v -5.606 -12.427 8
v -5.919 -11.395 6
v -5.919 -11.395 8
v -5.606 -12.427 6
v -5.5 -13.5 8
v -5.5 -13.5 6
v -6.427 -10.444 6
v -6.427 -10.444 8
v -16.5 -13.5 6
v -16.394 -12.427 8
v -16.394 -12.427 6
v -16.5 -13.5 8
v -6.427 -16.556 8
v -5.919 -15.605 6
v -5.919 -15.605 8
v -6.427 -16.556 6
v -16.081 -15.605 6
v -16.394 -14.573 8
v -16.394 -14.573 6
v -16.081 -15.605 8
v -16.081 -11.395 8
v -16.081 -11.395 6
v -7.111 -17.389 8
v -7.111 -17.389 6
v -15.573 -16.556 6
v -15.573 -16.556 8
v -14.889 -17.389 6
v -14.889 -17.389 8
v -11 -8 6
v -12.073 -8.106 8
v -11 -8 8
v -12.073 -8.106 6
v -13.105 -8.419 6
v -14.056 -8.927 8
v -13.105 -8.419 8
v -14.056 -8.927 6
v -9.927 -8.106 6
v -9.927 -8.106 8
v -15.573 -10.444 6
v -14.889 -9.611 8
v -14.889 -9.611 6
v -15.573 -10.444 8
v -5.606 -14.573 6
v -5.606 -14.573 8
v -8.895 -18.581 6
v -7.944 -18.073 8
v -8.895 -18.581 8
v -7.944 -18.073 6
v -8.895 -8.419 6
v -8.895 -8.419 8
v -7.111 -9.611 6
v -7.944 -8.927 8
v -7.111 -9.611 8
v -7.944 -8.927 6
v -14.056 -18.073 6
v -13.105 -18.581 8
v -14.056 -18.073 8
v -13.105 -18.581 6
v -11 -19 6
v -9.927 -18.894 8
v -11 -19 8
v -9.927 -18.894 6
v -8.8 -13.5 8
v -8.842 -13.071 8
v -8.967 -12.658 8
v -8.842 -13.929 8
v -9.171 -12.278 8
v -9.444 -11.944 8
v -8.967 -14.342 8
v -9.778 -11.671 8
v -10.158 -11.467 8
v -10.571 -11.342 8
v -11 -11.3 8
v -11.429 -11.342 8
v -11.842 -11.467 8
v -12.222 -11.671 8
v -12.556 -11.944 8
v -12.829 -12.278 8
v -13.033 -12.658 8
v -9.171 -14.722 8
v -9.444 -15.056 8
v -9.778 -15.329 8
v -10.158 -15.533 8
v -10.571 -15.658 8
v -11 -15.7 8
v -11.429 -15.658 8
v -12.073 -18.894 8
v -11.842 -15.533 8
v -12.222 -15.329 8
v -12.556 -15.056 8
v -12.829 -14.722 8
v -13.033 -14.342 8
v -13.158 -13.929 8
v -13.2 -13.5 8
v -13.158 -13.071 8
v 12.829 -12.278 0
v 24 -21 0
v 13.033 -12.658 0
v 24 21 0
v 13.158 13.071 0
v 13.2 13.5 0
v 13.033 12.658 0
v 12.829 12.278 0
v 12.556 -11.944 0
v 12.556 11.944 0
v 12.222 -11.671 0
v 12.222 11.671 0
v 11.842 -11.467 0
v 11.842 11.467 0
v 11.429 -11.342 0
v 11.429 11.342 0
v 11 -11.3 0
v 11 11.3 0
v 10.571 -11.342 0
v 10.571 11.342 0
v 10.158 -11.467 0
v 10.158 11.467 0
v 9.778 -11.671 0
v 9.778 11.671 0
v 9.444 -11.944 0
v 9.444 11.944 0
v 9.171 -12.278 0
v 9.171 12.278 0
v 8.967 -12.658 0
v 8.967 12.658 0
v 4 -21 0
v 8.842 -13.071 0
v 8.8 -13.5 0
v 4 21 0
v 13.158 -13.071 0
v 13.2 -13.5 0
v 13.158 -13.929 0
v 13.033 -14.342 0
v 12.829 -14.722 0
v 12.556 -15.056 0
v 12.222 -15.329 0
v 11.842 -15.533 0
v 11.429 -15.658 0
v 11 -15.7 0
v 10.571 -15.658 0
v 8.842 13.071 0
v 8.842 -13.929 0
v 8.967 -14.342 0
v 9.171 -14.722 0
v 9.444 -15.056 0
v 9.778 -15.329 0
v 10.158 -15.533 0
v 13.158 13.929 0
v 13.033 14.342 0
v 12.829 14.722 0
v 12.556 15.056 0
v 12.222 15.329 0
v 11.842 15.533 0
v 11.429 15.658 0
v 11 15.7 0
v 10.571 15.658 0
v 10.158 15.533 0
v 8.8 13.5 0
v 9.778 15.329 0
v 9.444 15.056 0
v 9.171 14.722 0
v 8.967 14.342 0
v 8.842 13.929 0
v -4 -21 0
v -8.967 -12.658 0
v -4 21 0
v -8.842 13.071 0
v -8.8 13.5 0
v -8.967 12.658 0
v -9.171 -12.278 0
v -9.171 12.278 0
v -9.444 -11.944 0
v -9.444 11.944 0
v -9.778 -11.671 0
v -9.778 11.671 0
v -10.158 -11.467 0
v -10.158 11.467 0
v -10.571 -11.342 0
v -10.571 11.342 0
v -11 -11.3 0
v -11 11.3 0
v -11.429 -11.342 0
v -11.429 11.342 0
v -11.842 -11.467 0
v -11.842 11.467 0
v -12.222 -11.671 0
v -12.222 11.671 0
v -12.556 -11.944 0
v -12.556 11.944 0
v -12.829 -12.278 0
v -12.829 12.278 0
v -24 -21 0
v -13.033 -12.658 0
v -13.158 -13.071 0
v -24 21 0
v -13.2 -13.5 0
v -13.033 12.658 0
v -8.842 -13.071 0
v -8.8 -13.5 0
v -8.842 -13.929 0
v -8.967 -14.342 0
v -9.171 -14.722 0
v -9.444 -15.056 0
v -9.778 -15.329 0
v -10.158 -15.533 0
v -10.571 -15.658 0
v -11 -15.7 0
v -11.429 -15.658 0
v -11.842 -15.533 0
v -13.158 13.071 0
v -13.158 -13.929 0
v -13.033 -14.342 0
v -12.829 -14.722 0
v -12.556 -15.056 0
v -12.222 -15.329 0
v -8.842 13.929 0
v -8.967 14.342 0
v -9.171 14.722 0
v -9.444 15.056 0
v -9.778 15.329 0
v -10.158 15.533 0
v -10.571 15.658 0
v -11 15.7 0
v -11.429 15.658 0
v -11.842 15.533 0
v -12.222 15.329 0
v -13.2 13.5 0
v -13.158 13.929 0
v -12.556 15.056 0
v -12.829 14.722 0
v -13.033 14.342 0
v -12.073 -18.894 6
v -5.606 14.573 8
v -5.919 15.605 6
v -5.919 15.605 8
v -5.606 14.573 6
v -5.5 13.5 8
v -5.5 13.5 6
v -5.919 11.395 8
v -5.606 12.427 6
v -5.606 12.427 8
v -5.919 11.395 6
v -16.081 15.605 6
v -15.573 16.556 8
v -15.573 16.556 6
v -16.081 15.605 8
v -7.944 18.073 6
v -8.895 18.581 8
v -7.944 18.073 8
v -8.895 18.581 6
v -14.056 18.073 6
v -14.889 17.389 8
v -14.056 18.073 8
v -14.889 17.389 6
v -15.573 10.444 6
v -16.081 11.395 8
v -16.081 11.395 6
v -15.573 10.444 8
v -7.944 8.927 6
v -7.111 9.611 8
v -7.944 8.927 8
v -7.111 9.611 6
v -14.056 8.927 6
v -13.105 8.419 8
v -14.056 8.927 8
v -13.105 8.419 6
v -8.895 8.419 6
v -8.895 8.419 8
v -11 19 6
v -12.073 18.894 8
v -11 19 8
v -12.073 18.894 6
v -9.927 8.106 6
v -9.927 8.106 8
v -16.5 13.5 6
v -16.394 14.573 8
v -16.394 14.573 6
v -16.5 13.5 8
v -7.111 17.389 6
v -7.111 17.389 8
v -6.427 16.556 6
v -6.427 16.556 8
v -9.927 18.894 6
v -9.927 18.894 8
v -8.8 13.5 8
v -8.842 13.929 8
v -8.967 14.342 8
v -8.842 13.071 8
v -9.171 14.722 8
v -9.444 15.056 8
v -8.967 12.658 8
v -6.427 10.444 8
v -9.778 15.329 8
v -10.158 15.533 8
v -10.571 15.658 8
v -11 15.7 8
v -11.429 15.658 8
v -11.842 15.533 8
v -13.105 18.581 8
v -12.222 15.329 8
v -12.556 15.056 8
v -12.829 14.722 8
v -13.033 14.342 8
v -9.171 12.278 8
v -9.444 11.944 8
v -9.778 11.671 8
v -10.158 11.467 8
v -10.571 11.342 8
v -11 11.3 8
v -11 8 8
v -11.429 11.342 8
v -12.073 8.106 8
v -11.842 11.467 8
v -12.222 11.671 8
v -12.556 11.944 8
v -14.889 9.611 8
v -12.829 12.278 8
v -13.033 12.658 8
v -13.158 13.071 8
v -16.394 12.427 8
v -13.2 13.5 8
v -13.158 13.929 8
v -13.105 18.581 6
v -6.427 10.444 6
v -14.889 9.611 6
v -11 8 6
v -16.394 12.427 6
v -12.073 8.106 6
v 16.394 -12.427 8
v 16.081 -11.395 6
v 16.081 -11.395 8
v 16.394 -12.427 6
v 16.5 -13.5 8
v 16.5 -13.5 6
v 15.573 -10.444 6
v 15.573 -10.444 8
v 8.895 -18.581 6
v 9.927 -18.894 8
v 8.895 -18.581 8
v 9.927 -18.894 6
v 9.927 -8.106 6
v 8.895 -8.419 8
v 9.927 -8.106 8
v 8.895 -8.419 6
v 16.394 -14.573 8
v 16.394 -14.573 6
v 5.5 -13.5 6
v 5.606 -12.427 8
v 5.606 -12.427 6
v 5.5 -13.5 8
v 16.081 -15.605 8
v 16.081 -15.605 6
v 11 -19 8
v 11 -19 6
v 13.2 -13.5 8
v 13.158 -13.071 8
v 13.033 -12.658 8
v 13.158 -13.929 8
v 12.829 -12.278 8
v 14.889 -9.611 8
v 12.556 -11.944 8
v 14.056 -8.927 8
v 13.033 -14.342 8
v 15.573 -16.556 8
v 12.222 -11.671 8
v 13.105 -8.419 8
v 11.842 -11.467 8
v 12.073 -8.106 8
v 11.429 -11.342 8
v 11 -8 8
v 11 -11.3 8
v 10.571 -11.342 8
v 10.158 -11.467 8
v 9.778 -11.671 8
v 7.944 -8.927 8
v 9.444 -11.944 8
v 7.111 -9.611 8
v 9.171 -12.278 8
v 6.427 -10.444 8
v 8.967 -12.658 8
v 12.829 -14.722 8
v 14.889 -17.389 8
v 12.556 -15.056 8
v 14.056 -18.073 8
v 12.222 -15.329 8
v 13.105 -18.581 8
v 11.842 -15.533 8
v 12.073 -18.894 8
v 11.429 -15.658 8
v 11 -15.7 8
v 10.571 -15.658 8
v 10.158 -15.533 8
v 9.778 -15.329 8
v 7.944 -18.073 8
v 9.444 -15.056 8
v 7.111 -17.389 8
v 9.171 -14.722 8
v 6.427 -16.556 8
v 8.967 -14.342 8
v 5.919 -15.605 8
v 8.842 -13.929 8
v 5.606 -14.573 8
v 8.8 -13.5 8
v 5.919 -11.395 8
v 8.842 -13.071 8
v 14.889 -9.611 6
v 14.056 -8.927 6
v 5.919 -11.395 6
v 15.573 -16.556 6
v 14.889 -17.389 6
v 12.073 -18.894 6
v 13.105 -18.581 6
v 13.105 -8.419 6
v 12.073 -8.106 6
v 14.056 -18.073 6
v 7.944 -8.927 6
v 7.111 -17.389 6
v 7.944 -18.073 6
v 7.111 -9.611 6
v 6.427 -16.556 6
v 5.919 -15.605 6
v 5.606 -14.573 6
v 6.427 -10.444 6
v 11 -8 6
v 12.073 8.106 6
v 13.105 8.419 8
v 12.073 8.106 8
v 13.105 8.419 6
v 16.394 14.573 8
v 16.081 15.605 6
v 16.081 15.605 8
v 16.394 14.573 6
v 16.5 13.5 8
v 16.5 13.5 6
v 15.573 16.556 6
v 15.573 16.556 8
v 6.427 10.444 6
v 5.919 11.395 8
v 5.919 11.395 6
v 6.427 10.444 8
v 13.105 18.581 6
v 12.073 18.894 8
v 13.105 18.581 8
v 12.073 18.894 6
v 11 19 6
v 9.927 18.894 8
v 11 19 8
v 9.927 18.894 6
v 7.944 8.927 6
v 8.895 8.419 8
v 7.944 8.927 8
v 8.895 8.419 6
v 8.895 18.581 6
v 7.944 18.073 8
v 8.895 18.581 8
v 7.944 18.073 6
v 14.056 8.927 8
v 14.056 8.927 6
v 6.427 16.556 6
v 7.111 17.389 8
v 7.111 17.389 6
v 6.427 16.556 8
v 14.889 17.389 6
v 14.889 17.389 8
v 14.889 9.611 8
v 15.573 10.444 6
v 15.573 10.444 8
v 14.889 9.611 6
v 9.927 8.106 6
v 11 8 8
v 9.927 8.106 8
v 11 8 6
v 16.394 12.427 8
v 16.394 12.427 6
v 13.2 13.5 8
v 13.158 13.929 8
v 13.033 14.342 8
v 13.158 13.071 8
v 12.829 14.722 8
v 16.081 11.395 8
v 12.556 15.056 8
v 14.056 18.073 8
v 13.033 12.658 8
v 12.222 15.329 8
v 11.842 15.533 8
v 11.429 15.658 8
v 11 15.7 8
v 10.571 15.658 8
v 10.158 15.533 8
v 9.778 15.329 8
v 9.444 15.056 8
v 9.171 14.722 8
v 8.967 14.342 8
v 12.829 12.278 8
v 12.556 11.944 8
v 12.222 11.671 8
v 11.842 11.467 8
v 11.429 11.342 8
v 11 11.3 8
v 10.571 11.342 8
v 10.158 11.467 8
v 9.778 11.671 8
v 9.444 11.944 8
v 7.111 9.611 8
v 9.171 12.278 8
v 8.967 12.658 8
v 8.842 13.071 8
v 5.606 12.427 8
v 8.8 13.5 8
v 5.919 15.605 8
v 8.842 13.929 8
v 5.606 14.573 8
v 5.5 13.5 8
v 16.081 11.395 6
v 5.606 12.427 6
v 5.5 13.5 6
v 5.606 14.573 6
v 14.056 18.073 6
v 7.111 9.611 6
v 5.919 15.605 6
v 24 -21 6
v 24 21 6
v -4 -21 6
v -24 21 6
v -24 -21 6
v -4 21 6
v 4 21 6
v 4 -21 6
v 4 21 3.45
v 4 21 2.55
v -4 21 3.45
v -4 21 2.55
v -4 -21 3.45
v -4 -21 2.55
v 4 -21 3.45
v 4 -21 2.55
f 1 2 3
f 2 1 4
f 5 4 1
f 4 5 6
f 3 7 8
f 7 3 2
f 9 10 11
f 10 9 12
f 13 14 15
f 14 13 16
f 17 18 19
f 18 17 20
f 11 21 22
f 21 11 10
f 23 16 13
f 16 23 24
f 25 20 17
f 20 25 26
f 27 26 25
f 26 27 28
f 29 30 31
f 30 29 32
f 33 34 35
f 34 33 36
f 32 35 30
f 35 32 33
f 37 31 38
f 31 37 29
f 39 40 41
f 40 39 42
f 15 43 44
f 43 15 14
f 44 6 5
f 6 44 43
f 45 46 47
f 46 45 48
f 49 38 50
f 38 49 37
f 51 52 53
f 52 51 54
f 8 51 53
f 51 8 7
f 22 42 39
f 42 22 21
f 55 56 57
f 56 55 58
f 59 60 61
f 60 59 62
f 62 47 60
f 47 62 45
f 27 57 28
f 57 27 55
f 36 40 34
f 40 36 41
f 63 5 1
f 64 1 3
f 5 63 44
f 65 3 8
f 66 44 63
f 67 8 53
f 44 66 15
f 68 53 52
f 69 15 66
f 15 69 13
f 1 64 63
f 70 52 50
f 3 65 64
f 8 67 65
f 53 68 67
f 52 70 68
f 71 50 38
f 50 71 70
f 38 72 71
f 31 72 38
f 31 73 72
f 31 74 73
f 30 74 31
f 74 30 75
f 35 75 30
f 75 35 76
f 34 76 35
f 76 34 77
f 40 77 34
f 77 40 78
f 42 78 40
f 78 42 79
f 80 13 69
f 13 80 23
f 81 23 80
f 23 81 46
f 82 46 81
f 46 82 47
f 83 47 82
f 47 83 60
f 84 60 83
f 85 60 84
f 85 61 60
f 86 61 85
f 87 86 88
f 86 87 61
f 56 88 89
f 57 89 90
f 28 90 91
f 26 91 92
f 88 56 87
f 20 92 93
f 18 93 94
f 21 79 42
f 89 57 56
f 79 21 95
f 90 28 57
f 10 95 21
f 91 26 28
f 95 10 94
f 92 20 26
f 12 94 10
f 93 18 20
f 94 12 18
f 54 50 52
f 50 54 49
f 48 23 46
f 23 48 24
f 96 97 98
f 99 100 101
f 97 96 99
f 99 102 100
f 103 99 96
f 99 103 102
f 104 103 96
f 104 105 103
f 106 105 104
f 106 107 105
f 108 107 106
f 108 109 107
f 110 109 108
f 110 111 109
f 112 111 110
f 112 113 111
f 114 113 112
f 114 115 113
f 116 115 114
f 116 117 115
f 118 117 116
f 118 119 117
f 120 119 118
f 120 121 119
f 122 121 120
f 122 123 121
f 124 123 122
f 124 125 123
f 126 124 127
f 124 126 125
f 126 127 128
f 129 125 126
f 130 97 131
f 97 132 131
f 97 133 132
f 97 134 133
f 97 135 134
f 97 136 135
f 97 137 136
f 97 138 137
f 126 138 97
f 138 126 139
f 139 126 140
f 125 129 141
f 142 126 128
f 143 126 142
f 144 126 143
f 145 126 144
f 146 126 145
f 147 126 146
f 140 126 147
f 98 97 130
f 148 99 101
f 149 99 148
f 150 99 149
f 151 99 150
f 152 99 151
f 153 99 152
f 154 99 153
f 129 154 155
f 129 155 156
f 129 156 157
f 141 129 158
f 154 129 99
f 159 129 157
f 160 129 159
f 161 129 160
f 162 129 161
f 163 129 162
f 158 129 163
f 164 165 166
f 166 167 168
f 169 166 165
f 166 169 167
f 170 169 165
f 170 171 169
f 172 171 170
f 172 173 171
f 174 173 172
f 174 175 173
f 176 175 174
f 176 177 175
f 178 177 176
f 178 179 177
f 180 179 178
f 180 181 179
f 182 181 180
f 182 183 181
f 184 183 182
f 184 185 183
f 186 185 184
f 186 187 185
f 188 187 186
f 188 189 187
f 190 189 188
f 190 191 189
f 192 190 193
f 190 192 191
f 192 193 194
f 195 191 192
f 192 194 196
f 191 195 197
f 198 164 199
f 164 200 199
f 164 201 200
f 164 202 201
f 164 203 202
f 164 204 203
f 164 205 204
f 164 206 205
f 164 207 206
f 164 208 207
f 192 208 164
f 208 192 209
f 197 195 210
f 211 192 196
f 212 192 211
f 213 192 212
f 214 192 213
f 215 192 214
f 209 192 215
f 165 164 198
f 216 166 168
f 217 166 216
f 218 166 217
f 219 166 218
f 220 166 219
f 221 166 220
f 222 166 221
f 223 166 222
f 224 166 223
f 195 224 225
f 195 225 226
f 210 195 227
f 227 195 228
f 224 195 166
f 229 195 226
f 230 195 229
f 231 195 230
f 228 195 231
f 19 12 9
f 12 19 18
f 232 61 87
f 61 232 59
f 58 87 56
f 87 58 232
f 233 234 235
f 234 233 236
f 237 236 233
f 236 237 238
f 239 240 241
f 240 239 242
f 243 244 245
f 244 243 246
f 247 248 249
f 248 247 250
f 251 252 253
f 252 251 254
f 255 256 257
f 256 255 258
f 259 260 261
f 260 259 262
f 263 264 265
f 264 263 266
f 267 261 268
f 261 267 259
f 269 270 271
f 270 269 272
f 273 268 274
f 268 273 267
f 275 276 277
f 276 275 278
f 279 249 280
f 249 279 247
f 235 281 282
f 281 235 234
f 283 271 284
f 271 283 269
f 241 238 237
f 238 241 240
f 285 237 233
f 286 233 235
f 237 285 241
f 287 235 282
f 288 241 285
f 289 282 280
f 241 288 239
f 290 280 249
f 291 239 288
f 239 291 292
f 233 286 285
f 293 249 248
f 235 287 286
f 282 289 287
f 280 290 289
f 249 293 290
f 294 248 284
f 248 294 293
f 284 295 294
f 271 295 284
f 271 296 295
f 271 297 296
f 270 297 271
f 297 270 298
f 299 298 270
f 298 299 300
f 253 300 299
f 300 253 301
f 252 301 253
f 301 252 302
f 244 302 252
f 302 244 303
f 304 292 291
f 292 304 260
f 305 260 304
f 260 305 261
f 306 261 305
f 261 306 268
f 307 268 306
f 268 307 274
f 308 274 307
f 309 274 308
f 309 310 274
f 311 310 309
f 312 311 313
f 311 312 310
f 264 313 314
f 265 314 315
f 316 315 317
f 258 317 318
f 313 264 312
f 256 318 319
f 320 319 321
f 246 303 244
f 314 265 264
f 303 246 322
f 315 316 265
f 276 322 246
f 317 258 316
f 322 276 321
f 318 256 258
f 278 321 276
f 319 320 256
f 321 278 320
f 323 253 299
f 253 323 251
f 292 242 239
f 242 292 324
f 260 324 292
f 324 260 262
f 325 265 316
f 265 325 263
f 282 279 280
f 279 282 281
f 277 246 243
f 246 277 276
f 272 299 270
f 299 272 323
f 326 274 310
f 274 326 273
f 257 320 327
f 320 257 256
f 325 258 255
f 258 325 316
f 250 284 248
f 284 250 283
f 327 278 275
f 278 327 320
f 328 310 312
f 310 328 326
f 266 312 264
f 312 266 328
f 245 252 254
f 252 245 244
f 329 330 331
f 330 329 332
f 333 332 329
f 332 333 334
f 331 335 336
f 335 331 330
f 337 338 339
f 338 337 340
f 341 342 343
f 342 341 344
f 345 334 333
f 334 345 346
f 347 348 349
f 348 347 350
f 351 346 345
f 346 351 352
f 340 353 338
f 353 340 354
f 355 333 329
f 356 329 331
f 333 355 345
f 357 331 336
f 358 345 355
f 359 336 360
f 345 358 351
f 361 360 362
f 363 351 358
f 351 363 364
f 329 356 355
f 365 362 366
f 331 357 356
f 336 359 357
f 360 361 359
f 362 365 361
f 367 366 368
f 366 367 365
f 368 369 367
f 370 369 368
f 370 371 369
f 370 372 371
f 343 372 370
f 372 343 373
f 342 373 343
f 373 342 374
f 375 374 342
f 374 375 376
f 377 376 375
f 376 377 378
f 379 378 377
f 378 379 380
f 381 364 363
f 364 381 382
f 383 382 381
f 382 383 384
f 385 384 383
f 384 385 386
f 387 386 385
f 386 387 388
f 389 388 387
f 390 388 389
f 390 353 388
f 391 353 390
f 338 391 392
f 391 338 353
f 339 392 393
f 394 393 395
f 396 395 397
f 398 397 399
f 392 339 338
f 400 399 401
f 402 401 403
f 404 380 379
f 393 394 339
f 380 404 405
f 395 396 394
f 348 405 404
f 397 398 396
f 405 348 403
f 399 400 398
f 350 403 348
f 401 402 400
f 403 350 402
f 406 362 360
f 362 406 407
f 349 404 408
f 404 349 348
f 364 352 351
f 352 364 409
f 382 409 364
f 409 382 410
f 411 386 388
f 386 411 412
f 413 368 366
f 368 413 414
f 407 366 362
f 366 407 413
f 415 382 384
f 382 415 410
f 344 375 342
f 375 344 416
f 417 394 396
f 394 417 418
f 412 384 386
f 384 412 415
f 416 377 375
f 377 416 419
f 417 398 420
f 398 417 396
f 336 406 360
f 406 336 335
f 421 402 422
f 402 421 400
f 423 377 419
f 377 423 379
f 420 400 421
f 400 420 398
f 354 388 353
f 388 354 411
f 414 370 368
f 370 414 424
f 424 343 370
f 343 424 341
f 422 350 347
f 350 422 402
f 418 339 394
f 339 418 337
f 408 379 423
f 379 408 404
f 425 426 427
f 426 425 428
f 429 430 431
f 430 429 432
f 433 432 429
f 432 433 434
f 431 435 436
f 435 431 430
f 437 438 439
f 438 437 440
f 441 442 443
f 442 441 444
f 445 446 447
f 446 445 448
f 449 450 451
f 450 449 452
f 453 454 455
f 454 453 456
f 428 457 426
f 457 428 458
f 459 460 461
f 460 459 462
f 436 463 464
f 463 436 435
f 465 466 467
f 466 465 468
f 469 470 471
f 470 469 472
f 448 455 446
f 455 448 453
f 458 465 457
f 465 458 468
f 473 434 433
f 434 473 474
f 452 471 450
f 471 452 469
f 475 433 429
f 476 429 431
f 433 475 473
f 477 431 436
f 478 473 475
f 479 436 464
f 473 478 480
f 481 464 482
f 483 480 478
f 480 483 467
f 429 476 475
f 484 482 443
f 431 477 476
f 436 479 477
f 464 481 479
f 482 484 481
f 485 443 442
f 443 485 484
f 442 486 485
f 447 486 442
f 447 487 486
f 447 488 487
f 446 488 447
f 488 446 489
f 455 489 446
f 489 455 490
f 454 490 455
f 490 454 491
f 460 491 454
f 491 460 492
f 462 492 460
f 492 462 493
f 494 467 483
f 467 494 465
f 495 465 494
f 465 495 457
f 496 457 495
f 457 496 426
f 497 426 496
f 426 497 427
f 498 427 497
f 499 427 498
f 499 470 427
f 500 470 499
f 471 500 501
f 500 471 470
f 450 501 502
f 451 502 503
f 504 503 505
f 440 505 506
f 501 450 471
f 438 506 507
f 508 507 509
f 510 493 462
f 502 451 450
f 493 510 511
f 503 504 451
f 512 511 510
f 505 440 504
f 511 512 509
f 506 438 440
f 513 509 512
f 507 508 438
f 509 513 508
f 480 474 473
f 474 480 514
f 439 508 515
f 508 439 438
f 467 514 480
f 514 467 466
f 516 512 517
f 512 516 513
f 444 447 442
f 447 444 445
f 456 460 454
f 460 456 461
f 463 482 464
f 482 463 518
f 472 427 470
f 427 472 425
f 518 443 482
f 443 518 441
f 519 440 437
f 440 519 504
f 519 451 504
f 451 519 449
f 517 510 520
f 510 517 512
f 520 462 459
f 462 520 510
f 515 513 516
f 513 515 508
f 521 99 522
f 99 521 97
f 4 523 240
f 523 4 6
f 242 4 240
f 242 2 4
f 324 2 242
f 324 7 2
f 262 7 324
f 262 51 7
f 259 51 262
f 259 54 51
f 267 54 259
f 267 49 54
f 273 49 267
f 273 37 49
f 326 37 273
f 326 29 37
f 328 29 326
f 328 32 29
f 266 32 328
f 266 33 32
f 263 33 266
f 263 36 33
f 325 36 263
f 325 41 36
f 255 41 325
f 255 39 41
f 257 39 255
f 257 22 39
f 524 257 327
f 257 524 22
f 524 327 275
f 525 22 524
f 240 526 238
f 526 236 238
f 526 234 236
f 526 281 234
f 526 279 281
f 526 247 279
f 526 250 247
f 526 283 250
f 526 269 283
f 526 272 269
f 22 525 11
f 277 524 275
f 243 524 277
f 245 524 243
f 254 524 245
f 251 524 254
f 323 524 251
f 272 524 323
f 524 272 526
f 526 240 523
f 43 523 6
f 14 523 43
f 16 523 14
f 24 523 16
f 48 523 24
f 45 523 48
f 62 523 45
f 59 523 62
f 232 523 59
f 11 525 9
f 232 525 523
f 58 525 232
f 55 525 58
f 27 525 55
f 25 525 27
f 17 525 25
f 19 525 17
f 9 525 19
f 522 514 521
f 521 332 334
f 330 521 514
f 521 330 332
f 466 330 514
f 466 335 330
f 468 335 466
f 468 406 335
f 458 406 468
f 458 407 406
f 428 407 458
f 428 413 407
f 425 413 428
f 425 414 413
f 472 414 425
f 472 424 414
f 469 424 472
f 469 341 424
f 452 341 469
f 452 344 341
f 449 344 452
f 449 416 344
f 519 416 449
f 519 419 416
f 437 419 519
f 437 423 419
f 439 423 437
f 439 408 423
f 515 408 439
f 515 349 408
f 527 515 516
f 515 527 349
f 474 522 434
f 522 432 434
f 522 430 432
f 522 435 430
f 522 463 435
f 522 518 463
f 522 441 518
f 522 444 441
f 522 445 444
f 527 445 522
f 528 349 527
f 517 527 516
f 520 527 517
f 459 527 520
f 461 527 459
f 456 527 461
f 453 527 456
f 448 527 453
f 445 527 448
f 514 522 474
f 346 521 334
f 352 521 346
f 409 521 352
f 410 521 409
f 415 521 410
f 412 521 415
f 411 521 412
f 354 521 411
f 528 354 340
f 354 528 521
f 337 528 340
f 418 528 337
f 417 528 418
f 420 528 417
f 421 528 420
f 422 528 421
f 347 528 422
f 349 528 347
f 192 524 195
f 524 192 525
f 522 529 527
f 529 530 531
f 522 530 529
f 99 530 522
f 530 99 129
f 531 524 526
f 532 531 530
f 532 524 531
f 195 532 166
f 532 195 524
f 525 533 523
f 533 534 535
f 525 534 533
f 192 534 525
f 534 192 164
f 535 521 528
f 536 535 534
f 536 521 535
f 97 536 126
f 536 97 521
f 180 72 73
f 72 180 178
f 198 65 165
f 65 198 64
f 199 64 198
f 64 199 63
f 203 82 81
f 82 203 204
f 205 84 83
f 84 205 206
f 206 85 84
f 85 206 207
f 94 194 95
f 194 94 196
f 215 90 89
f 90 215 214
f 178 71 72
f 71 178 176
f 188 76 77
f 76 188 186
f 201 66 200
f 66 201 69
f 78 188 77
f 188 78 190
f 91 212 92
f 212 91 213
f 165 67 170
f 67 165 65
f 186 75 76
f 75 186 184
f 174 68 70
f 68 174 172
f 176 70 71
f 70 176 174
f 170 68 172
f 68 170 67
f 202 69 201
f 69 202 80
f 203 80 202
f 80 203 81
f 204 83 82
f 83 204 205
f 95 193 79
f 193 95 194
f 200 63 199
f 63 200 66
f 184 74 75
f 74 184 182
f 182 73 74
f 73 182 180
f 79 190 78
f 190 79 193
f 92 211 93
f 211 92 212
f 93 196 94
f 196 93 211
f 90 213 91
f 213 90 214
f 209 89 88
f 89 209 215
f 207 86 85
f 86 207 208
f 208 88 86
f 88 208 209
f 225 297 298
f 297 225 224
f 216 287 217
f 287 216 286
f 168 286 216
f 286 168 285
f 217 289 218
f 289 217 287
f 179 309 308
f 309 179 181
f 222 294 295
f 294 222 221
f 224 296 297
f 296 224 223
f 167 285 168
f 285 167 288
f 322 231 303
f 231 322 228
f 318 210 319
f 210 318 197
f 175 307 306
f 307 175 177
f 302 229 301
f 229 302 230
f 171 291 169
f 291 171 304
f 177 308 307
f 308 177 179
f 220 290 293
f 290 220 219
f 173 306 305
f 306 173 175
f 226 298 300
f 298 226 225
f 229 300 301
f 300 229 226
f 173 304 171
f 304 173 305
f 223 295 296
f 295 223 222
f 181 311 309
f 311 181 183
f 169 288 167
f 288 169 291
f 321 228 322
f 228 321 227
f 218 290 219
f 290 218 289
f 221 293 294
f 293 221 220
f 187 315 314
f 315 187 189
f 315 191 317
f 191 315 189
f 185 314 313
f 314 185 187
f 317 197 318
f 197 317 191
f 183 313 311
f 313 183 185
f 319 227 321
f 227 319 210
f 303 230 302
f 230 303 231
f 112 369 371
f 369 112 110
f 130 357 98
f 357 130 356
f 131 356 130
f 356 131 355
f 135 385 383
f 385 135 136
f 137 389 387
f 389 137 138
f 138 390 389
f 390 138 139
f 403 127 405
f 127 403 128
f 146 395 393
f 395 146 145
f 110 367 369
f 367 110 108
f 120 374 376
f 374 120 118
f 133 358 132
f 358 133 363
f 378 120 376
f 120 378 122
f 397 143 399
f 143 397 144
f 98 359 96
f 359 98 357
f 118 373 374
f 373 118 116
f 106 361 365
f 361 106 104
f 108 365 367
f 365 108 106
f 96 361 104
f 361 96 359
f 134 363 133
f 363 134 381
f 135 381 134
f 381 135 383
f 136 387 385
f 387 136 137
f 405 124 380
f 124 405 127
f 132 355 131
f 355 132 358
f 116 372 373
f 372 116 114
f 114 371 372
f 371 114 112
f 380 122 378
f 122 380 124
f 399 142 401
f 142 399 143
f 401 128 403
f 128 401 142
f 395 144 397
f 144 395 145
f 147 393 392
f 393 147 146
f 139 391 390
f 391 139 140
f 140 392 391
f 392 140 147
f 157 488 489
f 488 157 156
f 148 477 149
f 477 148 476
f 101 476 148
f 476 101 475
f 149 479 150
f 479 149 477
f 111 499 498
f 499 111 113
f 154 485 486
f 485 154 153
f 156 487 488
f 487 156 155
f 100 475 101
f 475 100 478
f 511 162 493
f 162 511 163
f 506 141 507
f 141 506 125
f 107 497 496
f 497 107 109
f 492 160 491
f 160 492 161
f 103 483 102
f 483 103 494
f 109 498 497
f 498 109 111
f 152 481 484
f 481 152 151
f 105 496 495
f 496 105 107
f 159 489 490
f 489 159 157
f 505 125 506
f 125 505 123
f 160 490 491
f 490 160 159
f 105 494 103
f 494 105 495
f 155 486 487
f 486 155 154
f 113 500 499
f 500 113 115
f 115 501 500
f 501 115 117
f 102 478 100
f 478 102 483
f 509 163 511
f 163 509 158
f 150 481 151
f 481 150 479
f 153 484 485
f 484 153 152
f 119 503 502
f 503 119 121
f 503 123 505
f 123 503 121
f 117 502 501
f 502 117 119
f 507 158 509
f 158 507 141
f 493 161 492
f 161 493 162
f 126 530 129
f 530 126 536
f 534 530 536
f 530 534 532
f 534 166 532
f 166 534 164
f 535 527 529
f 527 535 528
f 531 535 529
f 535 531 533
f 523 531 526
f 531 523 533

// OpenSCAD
$fn = 32;

// ----------------------------------------------------------------------
// Living hinge: 48 x 42 mm plates, 0.9 mm flexible web
// ----------------------------------------------------------------------

// --- parameters (mm) ---
plate_len = 20;           // plate length outside the web
plate_w = 42;             // plate width
thick = 6;                // plate thickness
web_half = 4;             // half width of the flex band
web_t = 0.9;              // flexible web thickness
web_z = 2.55;             // web position inside the thickness
boss_d = 11;              // screw boss diameter
boss_h = 8;               // screw boss height
boss_x = 11;              // screw boss distance from the web
screw_d = 4.4;            // screw hole

difference() {
  union() {
    /* one flat strip, later thinned at the middle */
    translate([-24, -21, 0]) cube([48, 42, 6]);
    /* screw bosses, sunk 0.5 mm into the plates */
    for (sx = [-11, 11]) {
      for (sy = [-13.5, 13.5]) {
        translate([sx, sy, 0]) cylinder(h = boss_h, d = boss_d);
      }
    }
  }
  /* channel from below: leaves the web on top of it */
  translate([-4, -23.5, -2.5]) cube([8, 47, 5.05]);
  /* channel from above: thins the web down to web_t */
  translate([-4, -23.5, 3.45]) cube([8, 47, 5.05]);
  /* screw holes through the bosses */
  for (sx = [-11, 11]) {
    for (sy = [-13.5, 13.5]) {
      translate([sx, sy, -2.5]) cylinder(h = boss_h + 5, d = screw_d);
    }
  }
}
